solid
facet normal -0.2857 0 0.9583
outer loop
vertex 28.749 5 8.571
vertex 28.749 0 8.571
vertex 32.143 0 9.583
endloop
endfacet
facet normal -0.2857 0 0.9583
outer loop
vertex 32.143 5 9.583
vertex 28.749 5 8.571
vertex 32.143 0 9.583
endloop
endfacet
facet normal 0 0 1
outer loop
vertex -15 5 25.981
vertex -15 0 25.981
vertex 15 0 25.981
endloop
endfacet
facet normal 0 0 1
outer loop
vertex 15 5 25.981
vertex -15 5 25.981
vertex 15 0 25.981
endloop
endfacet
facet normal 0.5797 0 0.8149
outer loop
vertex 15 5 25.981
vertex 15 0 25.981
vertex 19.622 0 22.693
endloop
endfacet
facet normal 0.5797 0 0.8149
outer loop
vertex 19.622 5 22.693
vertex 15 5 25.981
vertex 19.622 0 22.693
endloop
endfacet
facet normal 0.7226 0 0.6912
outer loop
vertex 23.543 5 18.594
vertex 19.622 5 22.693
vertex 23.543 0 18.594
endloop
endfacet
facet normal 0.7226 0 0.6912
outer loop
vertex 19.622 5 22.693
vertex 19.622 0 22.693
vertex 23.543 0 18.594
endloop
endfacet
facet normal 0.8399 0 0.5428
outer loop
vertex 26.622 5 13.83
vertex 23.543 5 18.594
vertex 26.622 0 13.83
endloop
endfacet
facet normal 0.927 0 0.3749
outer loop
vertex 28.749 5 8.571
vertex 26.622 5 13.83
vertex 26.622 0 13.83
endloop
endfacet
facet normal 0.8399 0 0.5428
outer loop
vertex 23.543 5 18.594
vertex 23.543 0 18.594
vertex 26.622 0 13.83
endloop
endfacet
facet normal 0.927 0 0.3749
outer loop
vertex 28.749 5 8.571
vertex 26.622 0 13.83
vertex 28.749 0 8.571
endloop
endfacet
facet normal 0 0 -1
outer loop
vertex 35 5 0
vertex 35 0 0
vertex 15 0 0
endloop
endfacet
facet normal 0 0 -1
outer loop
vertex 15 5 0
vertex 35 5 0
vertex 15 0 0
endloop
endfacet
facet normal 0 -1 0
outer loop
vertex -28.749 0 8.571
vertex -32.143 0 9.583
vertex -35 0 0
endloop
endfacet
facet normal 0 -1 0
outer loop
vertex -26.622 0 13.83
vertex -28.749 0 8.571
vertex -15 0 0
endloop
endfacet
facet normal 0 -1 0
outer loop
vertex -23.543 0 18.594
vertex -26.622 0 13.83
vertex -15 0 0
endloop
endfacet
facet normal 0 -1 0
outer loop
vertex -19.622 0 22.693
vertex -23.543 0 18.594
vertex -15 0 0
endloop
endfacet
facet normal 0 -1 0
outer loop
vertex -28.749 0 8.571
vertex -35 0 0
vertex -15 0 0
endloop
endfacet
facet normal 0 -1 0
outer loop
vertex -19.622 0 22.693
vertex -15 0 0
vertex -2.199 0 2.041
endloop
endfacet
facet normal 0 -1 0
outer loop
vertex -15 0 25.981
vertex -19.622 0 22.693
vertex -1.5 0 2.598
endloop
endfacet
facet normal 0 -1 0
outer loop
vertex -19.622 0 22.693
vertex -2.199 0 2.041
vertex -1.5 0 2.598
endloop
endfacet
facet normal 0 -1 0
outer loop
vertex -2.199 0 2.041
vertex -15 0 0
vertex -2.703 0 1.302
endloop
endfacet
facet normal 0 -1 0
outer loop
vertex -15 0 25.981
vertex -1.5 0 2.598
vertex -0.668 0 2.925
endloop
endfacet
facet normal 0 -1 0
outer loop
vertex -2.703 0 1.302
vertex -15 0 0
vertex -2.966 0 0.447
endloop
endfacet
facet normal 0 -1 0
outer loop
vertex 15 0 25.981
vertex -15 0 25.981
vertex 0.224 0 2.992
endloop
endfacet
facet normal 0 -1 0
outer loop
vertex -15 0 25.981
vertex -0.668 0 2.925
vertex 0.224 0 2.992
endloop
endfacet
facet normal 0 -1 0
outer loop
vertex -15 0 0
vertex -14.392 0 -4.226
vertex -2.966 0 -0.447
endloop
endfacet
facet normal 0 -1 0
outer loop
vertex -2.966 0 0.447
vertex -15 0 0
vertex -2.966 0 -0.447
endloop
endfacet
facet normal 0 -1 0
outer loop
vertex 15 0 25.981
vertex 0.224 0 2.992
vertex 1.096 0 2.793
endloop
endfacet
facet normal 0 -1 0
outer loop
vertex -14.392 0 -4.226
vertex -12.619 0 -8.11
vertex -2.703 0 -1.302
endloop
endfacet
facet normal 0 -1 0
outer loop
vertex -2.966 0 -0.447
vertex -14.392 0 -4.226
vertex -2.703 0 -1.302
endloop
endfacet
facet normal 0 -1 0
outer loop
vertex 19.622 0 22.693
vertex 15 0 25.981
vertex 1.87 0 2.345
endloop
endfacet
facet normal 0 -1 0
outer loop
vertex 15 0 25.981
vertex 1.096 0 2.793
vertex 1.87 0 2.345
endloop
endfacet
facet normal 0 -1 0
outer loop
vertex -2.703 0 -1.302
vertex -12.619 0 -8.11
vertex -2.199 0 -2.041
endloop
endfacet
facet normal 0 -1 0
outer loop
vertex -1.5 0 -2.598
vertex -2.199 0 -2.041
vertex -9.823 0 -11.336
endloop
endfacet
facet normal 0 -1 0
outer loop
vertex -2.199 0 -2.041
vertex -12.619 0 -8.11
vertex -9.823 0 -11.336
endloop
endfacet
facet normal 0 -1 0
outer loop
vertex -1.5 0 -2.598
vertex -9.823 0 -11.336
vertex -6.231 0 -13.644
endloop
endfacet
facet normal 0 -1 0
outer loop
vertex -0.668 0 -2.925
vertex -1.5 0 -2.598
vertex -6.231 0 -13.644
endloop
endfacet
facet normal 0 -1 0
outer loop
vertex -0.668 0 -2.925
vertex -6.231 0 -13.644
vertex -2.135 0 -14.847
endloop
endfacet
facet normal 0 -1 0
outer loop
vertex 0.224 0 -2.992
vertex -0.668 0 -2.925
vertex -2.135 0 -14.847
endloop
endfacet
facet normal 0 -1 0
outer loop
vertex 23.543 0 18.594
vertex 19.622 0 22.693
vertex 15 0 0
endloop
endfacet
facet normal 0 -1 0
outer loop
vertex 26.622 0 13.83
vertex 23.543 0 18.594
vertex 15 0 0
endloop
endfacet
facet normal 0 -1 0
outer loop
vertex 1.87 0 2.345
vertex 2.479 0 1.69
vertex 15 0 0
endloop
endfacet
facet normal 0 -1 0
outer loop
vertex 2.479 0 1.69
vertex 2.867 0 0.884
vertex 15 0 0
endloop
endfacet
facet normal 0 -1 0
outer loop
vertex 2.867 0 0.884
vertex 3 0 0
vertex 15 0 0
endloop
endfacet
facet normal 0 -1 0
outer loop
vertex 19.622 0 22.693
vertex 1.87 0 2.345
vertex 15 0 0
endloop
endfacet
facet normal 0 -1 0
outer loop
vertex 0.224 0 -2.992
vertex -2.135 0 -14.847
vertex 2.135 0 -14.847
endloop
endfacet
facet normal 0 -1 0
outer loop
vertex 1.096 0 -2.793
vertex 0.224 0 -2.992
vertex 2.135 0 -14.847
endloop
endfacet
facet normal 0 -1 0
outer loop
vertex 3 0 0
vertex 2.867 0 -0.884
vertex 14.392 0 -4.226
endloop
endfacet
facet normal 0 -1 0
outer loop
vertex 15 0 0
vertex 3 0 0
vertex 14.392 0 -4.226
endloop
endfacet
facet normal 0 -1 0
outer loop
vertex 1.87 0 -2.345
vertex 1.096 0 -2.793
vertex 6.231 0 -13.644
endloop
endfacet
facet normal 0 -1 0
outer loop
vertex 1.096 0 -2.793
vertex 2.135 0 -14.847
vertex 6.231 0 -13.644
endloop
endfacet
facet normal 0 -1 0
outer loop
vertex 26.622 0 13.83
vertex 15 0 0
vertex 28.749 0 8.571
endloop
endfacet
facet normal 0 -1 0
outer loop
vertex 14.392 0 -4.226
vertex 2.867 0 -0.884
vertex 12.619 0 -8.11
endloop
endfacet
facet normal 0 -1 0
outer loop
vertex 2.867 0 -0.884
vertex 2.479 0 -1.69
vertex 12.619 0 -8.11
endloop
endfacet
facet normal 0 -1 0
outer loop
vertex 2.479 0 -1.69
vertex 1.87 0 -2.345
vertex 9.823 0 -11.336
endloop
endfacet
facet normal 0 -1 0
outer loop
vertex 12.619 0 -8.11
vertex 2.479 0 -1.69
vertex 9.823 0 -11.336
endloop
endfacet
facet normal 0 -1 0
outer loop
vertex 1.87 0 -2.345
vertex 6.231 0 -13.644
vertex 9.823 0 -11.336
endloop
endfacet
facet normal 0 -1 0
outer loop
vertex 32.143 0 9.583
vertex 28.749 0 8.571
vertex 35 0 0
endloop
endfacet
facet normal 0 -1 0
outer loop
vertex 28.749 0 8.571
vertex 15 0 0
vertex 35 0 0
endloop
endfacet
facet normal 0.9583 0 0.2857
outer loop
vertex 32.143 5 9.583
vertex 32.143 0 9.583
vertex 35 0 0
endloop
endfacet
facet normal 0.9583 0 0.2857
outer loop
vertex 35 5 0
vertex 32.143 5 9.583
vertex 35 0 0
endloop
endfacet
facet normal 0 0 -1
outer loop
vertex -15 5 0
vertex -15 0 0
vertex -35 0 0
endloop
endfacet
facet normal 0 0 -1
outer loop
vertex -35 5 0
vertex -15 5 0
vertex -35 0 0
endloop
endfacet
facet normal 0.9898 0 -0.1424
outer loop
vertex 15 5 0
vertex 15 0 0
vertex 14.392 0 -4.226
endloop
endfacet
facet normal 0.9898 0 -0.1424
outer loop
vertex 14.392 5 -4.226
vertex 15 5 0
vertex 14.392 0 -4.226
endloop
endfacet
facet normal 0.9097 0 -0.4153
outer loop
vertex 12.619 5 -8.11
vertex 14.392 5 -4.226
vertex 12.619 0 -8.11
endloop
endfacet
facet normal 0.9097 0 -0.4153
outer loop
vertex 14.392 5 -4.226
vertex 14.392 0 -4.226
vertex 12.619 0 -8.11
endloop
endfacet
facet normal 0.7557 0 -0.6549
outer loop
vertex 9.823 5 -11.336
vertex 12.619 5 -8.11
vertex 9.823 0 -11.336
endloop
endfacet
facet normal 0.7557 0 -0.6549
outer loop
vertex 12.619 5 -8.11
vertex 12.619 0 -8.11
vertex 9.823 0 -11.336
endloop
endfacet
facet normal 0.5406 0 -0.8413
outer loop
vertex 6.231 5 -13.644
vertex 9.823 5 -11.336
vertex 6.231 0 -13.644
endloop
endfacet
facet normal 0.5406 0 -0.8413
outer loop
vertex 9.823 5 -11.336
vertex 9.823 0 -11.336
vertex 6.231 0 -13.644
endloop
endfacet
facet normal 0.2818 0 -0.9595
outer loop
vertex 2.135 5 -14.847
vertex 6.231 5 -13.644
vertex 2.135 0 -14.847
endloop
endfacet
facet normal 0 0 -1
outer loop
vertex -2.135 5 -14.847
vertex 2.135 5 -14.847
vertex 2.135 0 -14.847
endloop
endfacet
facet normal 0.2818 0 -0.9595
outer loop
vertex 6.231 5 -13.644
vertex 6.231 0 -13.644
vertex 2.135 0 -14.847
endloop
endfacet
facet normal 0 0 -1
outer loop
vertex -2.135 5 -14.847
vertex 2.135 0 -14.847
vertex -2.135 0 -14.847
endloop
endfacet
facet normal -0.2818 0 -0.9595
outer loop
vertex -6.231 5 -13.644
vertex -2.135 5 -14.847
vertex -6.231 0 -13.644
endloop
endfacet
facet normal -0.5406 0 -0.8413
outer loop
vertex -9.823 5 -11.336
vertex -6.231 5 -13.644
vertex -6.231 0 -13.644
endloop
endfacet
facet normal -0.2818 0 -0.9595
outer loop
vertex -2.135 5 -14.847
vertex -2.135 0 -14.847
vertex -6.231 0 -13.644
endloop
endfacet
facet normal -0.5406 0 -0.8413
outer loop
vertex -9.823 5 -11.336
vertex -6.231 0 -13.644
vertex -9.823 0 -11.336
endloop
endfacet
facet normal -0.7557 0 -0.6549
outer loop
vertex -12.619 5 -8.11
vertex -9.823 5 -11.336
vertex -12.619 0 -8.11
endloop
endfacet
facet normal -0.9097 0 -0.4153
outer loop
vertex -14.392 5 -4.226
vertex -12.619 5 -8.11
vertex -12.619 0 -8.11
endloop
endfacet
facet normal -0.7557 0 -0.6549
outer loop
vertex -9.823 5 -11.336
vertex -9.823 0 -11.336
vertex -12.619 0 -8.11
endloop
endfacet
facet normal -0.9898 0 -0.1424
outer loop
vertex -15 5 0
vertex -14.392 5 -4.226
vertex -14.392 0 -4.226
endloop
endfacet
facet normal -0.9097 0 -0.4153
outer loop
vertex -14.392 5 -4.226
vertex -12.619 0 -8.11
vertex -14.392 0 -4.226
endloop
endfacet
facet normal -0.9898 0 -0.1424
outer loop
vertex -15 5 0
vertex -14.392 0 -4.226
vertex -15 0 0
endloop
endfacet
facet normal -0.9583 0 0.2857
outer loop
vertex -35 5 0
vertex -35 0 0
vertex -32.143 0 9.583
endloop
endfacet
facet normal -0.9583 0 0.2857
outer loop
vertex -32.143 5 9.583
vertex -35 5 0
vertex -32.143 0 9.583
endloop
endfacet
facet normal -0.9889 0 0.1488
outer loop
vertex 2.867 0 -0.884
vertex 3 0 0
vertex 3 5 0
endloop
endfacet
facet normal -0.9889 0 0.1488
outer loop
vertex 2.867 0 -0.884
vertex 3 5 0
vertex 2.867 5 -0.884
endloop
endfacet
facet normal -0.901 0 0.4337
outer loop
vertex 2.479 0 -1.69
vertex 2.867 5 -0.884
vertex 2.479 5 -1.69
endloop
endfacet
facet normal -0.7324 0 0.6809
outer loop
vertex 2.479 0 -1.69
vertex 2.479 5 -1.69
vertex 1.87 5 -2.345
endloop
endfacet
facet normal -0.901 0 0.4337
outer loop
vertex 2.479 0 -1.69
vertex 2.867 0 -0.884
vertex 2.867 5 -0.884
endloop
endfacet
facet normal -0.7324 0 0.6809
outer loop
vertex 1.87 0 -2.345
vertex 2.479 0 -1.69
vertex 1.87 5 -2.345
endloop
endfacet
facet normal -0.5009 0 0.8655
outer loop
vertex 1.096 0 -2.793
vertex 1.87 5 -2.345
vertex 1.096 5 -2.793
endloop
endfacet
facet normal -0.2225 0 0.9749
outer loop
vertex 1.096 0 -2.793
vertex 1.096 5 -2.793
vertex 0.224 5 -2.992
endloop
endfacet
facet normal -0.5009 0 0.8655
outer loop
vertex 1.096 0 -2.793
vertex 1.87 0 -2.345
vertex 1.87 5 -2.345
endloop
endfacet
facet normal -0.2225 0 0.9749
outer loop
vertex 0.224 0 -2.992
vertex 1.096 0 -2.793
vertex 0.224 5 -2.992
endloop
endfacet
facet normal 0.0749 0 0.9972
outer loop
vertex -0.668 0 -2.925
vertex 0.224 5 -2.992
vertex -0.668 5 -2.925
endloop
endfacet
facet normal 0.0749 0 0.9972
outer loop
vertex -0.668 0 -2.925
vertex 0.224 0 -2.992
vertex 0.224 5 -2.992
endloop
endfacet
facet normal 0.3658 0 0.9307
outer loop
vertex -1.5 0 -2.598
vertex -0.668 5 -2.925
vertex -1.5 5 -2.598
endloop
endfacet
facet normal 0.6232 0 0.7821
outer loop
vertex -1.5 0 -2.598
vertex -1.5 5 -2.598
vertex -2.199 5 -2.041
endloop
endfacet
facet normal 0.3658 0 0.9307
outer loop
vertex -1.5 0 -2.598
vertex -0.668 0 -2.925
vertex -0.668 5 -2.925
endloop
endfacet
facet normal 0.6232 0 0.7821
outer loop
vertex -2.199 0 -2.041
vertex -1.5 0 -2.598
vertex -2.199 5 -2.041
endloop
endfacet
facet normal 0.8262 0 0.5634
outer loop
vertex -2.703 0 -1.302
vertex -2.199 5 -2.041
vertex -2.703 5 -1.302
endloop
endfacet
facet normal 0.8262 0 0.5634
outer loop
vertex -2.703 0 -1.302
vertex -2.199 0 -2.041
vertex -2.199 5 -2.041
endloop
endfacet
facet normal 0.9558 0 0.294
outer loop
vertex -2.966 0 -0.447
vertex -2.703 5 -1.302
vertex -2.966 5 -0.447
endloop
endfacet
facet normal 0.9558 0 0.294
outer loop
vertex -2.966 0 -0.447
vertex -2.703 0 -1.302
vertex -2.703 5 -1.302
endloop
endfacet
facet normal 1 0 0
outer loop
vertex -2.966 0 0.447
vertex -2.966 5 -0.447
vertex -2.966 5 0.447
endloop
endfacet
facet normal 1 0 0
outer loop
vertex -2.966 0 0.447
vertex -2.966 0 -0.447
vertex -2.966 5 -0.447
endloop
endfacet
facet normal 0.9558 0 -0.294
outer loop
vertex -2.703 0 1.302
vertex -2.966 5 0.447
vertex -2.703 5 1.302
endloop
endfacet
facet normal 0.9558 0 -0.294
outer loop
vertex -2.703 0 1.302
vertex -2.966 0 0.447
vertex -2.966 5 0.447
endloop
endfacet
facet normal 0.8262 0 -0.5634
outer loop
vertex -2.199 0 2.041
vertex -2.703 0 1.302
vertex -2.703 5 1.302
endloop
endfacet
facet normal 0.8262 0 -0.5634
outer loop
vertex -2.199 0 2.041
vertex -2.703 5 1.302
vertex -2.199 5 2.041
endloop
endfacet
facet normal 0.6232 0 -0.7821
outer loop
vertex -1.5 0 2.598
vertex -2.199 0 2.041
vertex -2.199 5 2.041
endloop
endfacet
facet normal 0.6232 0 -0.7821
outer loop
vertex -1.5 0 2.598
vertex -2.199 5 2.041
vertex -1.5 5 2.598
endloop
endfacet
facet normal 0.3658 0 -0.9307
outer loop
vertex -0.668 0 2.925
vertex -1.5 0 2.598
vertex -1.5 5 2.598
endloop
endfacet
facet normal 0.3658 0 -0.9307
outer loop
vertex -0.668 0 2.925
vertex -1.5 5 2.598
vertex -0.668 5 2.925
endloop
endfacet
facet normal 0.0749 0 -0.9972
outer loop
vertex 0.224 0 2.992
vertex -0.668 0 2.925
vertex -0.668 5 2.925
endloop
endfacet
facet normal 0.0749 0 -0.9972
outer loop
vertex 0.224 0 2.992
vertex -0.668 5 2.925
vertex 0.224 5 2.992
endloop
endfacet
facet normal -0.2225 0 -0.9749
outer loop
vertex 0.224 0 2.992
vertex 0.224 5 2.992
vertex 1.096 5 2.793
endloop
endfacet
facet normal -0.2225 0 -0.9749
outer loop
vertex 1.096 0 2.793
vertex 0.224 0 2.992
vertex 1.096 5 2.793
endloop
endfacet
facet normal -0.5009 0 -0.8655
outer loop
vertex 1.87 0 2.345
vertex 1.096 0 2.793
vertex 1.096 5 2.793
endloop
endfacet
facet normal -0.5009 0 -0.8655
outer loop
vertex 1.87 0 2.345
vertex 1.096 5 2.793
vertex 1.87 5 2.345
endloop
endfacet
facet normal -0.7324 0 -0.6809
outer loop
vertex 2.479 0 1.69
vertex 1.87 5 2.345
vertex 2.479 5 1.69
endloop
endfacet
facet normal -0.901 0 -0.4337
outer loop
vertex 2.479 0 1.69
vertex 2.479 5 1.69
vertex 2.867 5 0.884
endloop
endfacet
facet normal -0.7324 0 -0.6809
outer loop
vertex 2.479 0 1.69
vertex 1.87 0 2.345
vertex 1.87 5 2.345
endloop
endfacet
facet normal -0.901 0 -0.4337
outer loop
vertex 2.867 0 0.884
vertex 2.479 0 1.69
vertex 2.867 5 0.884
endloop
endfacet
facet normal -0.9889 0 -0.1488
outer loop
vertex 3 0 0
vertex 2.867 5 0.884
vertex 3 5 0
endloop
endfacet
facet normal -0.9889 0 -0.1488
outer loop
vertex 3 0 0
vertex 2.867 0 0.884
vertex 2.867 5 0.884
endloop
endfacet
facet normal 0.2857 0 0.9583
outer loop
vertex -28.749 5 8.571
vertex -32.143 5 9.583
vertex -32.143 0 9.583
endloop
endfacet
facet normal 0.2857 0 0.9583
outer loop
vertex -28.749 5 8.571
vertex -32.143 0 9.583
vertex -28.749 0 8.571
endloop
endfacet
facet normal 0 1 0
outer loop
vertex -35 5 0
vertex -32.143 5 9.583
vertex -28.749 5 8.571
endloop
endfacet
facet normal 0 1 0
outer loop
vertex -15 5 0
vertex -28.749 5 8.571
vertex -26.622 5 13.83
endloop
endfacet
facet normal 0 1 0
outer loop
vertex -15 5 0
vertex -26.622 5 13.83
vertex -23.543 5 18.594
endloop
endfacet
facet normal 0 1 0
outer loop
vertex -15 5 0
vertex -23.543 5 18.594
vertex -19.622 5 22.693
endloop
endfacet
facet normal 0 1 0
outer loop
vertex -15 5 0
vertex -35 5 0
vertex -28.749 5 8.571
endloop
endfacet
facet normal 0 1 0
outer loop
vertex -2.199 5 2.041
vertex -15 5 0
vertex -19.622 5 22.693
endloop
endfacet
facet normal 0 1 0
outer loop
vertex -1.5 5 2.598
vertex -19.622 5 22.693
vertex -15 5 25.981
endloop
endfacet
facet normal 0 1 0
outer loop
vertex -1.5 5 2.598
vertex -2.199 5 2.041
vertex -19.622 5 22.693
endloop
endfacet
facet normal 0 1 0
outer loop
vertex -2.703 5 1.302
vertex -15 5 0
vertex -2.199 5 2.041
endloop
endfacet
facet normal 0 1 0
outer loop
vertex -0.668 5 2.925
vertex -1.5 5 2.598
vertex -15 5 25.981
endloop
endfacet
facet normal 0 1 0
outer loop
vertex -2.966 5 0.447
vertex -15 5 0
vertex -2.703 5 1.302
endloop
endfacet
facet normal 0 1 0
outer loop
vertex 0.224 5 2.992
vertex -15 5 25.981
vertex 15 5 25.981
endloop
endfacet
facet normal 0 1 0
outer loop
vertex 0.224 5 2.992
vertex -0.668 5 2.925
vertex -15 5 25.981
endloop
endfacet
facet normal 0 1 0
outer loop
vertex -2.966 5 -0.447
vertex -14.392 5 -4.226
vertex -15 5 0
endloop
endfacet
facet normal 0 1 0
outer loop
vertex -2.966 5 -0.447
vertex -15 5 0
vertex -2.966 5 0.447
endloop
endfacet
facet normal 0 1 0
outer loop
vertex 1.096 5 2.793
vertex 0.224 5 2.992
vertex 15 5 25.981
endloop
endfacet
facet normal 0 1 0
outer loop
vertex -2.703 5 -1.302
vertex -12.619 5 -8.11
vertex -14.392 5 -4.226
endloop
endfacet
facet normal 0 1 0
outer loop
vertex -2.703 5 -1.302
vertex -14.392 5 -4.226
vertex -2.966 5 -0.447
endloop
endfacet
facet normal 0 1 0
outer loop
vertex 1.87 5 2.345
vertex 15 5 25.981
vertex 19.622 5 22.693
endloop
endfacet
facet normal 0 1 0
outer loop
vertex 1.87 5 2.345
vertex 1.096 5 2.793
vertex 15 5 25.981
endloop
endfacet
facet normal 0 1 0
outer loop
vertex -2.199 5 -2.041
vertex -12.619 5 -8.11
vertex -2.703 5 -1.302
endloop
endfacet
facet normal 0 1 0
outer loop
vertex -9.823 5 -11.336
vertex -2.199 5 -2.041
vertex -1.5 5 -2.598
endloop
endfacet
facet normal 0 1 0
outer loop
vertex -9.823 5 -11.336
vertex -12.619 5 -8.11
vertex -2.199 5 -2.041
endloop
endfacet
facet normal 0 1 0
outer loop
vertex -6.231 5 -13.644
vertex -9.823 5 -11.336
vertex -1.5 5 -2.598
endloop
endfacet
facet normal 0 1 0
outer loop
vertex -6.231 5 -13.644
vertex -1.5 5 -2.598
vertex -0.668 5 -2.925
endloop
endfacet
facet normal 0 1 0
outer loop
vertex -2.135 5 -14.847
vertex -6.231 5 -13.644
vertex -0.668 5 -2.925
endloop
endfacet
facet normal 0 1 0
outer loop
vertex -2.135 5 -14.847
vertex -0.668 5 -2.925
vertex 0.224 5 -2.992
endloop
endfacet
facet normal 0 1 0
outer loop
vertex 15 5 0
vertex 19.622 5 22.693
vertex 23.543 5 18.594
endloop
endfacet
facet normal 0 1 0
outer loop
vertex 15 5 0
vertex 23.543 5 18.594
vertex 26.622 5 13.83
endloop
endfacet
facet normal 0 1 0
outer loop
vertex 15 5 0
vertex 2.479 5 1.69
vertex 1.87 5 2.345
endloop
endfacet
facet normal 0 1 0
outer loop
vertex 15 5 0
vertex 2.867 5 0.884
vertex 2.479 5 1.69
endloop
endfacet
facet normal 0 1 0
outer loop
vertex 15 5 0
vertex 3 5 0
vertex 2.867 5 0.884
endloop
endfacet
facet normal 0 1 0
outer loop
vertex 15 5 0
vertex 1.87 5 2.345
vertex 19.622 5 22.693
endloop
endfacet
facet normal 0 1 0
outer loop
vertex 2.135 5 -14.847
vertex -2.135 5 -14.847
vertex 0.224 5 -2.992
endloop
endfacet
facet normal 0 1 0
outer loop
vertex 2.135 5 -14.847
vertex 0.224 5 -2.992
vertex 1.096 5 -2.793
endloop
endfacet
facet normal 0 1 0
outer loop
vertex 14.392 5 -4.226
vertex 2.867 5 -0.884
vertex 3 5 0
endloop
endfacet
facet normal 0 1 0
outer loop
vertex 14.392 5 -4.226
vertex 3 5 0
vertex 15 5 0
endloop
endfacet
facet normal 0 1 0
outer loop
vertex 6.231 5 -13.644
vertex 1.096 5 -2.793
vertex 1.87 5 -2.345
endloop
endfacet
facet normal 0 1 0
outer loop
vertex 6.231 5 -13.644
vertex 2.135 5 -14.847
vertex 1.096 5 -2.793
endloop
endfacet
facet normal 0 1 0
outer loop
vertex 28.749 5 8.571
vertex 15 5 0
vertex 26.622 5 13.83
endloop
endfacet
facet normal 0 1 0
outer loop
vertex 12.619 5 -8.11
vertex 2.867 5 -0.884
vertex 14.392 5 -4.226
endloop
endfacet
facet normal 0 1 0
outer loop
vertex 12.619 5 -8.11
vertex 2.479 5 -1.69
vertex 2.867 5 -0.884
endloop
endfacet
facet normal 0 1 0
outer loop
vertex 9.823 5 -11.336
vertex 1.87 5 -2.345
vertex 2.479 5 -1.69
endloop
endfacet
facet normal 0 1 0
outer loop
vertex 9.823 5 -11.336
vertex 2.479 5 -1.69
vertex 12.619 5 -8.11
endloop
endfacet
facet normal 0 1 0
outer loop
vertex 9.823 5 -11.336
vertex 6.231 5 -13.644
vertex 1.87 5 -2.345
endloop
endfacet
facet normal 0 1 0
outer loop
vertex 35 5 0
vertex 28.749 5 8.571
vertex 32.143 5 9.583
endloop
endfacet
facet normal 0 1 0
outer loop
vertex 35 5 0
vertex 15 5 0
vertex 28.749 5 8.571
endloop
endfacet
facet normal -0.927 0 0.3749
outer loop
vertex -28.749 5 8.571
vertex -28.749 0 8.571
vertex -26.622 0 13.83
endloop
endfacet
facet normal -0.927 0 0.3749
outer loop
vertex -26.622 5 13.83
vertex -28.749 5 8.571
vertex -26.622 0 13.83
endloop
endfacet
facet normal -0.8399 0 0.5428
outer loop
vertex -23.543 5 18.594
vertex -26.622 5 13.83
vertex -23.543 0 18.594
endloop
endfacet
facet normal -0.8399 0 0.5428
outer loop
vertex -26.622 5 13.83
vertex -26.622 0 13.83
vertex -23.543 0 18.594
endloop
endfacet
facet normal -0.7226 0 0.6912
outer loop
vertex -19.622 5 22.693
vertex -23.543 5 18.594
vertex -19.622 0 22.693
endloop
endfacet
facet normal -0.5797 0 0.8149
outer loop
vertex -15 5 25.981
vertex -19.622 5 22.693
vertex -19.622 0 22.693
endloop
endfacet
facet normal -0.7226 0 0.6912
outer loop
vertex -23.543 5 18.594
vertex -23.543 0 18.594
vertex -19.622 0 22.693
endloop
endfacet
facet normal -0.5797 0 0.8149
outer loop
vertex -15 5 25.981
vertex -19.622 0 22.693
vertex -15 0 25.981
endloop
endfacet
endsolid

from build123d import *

# Parameters (mm, degrees)
SKETCH1_R           = 3
BOSS_EXTRUDE1_DEPTH = 5


with BuildPart() as part:
    # Sketch1 → Boss-Extrude1 (new body)
    with BuildSketch(Plane(origin=(0, 0, 0), x_dir=(1, 0, 0), z_dir=(0, 1, 0))):
        with BuildLine():
            ThreePointArc((15, 0), (0, 15), (-15, 0))
            Line((-15, 0), (-30, 0))
            Line((-30, 0), (-35, 0))
            Line((-35, 0), (-32.142857143, -9.583148475))
            Line((-32.142857143, -9.583148475), (-28.749445425, -8.571428571))
            ThreePointArc((-28.749445425, -8.571428571), (-23.543039679, -18.593689323), (-15, -25.980762114))
            Line((-15, -25.980762114), (15, -25.980762114))
            ThreePointArc((15, -25.980762114), (23.543039679, -18.593689323), (28.749445425, -8.571428571))
            Line((28.749445425, -8.571428571), (32.142857143, -9.583148475))
            Line((32.142857143, -9.583148475), (35, 0))
            Line((35, 0), (30, 0))
            Line((30, 0), (15, 0))
        make_face()
        Circle(SKETCH1_R, mode=Mode.SUBTRACT)
    extrude(amount=BOSS_EXTRUDE1_DEPTH)


solid = part.part
